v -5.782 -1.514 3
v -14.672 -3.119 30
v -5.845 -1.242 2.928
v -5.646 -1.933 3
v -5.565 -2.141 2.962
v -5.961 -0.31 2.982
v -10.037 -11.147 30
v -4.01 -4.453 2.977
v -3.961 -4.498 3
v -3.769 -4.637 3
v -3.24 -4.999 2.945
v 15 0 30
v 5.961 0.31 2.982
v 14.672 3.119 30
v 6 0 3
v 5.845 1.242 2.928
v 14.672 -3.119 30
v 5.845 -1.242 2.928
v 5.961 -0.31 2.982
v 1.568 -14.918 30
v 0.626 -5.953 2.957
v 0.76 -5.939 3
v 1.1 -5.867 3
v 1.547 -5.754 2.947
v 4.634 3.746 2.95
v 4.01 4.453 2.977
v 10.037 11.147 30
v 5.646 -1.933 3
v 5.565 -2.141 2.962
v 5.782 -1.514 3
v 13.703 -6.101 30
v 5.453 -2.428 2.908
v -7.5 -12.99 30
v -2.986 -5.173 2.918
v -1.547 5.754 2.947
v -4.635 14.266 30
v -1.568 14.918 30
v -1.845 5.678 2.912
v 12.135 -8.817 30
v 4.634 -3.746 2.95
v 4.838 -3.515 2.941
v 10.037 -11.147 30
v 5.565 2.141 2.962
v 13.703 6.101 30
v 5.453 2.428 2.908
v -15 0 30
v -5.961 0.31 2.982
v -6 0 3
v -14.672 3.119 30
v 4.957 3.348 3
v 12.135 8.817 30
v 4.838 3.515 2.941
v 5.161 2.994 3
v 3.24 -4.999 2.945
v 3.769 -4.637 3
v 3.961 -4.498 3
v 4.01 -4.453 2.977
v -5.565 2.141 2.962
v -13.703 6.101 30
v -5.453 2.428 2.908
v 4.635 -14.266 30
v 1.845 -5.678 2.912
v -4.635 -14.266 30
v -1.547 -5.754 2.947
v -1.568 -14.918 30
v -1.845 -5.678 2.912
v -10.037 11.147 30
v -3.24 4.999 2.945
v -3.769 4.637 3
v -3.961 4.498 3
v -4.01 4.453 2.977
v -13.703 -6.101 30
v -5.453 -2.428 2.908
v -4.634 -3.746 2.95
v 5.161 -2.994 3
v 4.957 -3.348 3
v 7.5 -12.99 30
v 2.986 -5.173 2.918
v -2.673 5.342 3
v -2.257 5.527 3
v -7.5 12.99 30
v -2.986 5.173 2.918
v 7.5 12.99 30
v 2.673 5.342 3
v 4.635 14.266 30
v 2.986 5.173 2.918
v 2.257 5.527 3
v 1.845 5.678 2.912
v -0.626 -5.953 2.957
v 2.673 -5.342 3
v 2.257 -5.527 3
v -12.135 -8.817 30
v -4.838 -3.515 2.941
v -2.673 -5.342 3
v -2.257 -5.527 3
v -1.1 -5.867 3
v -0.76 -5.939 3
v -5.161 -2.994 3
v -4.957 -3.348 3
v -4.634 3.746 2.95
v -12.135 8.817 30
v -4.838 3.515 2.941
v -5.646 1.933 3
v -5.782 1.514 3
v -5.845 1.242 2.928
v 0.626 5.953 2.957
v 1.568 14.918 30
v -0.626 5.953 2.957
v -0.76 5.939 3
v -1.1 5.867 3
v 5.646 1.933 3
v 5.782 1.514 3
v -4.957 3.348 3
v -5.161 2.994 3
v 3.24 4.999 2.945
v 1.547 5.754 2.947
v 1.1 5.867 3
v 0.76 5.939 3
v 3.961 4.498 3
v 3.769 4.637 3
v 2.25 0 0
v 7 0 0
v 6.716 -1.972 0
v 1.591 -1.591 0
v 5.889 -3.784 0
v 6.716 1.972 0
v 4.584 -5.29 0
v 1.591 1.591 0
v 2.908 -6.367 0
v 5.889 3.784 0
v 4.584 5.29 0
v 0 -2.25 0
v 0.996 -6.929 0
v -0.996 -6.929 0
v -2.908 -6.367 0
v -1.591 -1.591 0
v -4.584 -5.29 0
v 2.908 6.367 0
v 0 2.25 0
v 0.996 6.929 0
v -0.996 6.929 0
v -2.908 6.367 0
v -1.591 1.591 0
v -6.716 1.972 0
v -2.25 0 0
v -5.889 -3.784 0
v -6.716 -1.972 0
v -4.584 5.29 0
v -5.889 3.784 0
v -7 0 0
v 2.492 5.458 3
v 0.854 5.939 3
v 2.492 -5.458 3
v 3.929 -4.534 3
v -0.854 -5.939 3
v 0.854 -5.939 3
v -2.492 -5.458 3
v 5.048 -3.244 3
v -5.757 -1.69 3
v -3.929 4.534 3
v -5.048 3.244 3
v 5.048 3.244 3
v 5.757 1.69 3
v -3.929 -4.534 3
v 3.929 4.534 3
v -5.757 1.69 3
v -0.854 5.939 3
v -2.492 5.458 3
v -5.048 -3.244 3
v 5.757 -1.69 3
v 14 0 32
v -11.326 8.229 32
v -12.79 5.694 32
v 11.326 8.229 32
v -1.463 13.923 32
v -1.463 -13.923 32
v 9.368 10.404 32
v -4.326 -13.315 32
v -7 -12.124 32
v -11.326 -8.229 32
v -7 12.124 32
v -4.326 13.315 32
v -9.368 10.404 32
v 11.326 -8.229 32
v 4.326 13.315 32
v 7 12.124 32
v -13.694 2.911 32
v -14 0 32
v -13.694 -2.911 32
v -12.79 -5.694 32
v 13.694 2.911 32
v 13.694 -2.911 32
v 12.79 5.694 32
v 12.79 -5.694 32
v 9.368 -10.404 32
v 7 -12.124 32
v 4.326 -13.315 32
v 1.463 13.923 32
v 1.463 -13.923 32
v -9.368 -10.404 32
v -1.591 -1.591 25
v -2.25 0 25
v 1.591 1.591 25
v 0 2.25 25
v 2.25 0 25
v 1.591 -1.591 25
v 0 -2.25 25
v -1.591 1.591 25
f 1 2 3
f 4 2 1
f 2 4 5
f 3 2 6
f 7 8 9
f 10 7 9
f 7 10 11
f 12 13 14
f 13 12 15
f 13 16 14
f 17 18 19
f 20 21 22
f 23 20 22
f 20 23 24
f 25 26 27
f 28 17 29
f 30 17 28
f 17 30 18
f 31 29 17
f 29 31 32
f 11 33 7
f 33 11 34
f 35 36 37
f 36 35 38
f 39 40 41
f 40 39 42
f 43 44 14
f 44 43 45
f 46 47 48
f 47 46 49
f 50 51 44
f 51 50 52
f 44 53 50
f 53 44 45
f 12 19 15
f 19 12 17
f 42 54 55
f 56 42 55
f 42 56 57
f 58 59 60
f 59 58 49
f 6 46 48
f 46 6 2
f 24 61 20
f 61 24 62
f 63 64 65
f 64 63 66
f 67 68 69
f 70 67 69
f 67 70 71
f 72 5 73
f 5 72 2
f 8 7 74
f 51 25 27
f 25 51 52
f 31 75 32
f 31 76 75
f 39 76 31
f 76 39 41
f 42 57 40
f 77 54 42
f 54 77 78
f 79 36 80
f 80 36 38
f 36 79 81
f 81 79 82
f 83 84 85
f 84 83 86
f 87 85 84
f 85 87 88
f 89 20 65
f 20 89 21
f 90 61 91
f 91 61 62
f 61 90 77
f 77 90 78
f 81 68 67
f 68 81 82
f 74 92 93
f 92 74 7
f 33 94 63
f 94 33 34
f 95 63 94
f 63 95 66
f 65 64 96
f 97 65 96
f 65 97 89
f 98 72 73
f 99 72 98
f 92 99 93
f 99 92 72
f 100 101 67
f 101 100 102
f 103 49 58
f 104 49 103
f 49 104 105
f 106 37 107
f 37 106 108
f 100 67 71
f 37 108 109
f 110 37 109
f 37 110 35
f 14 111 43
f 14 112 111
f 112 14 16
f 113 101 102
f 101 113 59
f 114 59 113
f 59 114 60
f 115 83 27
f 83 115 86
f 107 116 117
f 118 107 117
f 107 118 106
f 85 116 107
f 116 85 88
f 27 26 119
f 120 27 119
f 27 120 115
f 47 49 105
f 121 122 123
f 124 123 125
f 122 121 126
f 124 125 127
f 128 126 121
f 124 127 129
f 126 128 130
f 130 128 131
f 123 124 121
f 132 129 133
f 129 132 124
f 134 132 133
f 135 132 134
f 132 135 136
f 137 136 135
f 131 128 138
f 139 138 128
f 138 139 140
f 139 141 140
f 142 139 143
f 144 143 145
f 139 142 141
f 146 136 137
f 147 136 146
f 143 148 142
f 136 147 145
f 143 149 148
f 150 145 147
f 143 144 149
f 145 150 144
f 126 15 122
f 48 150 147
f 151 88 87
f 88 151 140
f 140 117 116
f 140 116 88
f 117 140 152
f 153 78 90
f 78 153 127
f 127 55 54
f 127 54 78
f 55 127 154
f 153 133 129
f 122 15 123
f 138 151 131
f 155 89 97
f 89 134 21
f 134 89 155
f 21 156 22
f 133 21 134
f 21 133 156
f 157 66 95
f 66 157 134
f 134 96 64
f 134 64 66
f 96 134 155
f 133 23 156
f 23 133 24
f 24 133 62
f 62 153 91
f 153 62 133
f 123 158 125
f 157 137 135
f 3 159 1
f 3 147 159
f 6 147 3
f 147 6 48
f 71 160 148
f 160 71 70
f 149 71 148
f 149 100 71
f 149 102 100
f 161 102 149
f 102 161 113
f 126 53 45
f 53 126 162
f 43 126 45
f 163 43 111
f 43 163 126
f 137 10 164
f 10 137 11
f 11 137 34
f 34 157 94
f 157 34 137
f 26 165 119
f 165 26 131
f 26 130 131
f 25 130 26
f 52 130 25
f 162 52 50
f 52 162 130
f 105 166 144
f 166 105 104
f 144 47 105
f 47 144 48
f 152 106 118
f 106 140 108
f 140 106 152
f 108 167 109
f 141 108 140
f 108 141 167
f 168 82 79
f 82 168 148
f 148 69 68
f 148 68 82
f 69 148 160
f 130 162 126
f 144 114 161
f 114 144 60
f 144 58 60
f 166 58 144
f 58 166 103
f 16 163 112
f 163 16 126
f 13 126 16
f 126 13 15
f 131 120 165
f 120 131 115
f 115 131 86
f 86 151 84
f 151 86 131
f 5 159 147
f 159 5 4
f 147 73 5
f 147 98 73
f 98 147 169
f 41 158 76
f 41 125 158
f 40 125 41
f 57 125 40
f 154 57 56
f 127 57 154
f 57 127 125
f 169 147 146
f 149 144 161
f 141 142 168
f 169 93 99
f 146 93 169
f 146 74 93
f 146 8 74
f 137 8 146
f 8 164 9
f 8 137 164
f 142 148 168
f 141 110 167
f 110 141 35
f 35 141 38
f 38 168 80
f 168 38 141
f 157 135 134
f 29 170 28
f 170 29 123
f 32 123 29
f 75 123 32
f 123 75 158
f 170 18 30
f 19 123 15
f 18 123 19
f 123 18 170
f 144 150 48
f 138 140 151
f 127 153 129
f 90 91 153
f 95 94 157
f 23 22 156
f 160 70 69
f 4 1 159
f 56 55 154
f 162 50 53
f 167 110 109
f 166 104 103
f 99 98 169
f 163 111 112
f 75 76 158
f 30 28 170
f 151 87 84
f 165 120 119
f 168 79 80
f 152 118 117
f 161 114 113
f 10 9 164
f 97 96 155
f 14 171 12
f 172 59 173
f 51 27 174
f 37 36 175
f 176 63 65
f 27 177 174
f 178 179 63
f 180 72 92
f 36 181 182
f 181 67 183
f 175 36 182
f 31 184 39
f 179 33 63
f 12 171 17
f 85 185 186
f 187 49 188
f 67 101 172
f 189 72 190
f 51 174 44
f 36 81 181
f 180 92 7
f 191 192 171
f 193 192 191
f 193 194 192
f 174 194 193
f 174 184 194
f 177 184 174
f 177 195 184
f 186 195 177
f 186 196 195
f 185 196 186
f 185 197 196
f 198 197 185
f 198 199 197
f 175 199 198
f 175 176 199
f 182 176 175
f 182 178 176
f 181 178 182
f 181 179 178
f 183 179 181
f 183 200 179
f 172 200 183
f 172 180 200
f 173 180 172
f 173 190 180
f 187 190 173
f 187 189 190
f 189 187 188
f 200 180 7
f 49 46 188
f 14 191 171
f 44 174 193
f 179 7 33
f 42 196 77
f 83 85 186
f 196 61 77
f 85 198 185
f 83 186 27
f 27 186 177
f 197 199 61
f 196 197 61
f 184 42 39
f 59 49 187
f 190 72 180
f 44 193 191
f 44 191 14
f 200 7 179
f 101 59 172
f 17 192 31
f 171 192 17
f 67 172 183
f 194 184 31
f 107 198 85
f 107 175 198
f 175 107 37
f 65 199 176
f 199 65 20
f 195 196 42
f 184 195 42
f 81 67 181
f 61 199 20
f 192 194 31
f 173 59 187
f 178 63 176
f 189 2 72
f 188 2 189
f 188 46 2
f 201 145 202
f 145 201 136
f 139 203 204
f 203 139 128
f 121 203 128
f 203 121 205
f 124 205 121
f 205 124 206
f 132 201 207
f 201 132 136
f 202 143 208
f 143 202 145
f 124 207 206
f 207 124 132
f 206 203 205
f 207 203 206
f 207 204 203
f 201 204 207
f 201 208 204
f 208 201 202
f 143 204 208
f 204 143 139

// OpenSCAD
module handle(holeRadius) {
    difference() {
        union() {
            cylinder(r1 = 5, r2 = 15, h = 30);
            cylinder(r1 = 7, r2 = 6, h= 3);
            translate([0, 0, 30]) {
                cylinder(r1 = 15, r2=14, h=2);
            }
        }
        cylinder(r = holeRadius, h=25);
    }
}

handle(2.25);
